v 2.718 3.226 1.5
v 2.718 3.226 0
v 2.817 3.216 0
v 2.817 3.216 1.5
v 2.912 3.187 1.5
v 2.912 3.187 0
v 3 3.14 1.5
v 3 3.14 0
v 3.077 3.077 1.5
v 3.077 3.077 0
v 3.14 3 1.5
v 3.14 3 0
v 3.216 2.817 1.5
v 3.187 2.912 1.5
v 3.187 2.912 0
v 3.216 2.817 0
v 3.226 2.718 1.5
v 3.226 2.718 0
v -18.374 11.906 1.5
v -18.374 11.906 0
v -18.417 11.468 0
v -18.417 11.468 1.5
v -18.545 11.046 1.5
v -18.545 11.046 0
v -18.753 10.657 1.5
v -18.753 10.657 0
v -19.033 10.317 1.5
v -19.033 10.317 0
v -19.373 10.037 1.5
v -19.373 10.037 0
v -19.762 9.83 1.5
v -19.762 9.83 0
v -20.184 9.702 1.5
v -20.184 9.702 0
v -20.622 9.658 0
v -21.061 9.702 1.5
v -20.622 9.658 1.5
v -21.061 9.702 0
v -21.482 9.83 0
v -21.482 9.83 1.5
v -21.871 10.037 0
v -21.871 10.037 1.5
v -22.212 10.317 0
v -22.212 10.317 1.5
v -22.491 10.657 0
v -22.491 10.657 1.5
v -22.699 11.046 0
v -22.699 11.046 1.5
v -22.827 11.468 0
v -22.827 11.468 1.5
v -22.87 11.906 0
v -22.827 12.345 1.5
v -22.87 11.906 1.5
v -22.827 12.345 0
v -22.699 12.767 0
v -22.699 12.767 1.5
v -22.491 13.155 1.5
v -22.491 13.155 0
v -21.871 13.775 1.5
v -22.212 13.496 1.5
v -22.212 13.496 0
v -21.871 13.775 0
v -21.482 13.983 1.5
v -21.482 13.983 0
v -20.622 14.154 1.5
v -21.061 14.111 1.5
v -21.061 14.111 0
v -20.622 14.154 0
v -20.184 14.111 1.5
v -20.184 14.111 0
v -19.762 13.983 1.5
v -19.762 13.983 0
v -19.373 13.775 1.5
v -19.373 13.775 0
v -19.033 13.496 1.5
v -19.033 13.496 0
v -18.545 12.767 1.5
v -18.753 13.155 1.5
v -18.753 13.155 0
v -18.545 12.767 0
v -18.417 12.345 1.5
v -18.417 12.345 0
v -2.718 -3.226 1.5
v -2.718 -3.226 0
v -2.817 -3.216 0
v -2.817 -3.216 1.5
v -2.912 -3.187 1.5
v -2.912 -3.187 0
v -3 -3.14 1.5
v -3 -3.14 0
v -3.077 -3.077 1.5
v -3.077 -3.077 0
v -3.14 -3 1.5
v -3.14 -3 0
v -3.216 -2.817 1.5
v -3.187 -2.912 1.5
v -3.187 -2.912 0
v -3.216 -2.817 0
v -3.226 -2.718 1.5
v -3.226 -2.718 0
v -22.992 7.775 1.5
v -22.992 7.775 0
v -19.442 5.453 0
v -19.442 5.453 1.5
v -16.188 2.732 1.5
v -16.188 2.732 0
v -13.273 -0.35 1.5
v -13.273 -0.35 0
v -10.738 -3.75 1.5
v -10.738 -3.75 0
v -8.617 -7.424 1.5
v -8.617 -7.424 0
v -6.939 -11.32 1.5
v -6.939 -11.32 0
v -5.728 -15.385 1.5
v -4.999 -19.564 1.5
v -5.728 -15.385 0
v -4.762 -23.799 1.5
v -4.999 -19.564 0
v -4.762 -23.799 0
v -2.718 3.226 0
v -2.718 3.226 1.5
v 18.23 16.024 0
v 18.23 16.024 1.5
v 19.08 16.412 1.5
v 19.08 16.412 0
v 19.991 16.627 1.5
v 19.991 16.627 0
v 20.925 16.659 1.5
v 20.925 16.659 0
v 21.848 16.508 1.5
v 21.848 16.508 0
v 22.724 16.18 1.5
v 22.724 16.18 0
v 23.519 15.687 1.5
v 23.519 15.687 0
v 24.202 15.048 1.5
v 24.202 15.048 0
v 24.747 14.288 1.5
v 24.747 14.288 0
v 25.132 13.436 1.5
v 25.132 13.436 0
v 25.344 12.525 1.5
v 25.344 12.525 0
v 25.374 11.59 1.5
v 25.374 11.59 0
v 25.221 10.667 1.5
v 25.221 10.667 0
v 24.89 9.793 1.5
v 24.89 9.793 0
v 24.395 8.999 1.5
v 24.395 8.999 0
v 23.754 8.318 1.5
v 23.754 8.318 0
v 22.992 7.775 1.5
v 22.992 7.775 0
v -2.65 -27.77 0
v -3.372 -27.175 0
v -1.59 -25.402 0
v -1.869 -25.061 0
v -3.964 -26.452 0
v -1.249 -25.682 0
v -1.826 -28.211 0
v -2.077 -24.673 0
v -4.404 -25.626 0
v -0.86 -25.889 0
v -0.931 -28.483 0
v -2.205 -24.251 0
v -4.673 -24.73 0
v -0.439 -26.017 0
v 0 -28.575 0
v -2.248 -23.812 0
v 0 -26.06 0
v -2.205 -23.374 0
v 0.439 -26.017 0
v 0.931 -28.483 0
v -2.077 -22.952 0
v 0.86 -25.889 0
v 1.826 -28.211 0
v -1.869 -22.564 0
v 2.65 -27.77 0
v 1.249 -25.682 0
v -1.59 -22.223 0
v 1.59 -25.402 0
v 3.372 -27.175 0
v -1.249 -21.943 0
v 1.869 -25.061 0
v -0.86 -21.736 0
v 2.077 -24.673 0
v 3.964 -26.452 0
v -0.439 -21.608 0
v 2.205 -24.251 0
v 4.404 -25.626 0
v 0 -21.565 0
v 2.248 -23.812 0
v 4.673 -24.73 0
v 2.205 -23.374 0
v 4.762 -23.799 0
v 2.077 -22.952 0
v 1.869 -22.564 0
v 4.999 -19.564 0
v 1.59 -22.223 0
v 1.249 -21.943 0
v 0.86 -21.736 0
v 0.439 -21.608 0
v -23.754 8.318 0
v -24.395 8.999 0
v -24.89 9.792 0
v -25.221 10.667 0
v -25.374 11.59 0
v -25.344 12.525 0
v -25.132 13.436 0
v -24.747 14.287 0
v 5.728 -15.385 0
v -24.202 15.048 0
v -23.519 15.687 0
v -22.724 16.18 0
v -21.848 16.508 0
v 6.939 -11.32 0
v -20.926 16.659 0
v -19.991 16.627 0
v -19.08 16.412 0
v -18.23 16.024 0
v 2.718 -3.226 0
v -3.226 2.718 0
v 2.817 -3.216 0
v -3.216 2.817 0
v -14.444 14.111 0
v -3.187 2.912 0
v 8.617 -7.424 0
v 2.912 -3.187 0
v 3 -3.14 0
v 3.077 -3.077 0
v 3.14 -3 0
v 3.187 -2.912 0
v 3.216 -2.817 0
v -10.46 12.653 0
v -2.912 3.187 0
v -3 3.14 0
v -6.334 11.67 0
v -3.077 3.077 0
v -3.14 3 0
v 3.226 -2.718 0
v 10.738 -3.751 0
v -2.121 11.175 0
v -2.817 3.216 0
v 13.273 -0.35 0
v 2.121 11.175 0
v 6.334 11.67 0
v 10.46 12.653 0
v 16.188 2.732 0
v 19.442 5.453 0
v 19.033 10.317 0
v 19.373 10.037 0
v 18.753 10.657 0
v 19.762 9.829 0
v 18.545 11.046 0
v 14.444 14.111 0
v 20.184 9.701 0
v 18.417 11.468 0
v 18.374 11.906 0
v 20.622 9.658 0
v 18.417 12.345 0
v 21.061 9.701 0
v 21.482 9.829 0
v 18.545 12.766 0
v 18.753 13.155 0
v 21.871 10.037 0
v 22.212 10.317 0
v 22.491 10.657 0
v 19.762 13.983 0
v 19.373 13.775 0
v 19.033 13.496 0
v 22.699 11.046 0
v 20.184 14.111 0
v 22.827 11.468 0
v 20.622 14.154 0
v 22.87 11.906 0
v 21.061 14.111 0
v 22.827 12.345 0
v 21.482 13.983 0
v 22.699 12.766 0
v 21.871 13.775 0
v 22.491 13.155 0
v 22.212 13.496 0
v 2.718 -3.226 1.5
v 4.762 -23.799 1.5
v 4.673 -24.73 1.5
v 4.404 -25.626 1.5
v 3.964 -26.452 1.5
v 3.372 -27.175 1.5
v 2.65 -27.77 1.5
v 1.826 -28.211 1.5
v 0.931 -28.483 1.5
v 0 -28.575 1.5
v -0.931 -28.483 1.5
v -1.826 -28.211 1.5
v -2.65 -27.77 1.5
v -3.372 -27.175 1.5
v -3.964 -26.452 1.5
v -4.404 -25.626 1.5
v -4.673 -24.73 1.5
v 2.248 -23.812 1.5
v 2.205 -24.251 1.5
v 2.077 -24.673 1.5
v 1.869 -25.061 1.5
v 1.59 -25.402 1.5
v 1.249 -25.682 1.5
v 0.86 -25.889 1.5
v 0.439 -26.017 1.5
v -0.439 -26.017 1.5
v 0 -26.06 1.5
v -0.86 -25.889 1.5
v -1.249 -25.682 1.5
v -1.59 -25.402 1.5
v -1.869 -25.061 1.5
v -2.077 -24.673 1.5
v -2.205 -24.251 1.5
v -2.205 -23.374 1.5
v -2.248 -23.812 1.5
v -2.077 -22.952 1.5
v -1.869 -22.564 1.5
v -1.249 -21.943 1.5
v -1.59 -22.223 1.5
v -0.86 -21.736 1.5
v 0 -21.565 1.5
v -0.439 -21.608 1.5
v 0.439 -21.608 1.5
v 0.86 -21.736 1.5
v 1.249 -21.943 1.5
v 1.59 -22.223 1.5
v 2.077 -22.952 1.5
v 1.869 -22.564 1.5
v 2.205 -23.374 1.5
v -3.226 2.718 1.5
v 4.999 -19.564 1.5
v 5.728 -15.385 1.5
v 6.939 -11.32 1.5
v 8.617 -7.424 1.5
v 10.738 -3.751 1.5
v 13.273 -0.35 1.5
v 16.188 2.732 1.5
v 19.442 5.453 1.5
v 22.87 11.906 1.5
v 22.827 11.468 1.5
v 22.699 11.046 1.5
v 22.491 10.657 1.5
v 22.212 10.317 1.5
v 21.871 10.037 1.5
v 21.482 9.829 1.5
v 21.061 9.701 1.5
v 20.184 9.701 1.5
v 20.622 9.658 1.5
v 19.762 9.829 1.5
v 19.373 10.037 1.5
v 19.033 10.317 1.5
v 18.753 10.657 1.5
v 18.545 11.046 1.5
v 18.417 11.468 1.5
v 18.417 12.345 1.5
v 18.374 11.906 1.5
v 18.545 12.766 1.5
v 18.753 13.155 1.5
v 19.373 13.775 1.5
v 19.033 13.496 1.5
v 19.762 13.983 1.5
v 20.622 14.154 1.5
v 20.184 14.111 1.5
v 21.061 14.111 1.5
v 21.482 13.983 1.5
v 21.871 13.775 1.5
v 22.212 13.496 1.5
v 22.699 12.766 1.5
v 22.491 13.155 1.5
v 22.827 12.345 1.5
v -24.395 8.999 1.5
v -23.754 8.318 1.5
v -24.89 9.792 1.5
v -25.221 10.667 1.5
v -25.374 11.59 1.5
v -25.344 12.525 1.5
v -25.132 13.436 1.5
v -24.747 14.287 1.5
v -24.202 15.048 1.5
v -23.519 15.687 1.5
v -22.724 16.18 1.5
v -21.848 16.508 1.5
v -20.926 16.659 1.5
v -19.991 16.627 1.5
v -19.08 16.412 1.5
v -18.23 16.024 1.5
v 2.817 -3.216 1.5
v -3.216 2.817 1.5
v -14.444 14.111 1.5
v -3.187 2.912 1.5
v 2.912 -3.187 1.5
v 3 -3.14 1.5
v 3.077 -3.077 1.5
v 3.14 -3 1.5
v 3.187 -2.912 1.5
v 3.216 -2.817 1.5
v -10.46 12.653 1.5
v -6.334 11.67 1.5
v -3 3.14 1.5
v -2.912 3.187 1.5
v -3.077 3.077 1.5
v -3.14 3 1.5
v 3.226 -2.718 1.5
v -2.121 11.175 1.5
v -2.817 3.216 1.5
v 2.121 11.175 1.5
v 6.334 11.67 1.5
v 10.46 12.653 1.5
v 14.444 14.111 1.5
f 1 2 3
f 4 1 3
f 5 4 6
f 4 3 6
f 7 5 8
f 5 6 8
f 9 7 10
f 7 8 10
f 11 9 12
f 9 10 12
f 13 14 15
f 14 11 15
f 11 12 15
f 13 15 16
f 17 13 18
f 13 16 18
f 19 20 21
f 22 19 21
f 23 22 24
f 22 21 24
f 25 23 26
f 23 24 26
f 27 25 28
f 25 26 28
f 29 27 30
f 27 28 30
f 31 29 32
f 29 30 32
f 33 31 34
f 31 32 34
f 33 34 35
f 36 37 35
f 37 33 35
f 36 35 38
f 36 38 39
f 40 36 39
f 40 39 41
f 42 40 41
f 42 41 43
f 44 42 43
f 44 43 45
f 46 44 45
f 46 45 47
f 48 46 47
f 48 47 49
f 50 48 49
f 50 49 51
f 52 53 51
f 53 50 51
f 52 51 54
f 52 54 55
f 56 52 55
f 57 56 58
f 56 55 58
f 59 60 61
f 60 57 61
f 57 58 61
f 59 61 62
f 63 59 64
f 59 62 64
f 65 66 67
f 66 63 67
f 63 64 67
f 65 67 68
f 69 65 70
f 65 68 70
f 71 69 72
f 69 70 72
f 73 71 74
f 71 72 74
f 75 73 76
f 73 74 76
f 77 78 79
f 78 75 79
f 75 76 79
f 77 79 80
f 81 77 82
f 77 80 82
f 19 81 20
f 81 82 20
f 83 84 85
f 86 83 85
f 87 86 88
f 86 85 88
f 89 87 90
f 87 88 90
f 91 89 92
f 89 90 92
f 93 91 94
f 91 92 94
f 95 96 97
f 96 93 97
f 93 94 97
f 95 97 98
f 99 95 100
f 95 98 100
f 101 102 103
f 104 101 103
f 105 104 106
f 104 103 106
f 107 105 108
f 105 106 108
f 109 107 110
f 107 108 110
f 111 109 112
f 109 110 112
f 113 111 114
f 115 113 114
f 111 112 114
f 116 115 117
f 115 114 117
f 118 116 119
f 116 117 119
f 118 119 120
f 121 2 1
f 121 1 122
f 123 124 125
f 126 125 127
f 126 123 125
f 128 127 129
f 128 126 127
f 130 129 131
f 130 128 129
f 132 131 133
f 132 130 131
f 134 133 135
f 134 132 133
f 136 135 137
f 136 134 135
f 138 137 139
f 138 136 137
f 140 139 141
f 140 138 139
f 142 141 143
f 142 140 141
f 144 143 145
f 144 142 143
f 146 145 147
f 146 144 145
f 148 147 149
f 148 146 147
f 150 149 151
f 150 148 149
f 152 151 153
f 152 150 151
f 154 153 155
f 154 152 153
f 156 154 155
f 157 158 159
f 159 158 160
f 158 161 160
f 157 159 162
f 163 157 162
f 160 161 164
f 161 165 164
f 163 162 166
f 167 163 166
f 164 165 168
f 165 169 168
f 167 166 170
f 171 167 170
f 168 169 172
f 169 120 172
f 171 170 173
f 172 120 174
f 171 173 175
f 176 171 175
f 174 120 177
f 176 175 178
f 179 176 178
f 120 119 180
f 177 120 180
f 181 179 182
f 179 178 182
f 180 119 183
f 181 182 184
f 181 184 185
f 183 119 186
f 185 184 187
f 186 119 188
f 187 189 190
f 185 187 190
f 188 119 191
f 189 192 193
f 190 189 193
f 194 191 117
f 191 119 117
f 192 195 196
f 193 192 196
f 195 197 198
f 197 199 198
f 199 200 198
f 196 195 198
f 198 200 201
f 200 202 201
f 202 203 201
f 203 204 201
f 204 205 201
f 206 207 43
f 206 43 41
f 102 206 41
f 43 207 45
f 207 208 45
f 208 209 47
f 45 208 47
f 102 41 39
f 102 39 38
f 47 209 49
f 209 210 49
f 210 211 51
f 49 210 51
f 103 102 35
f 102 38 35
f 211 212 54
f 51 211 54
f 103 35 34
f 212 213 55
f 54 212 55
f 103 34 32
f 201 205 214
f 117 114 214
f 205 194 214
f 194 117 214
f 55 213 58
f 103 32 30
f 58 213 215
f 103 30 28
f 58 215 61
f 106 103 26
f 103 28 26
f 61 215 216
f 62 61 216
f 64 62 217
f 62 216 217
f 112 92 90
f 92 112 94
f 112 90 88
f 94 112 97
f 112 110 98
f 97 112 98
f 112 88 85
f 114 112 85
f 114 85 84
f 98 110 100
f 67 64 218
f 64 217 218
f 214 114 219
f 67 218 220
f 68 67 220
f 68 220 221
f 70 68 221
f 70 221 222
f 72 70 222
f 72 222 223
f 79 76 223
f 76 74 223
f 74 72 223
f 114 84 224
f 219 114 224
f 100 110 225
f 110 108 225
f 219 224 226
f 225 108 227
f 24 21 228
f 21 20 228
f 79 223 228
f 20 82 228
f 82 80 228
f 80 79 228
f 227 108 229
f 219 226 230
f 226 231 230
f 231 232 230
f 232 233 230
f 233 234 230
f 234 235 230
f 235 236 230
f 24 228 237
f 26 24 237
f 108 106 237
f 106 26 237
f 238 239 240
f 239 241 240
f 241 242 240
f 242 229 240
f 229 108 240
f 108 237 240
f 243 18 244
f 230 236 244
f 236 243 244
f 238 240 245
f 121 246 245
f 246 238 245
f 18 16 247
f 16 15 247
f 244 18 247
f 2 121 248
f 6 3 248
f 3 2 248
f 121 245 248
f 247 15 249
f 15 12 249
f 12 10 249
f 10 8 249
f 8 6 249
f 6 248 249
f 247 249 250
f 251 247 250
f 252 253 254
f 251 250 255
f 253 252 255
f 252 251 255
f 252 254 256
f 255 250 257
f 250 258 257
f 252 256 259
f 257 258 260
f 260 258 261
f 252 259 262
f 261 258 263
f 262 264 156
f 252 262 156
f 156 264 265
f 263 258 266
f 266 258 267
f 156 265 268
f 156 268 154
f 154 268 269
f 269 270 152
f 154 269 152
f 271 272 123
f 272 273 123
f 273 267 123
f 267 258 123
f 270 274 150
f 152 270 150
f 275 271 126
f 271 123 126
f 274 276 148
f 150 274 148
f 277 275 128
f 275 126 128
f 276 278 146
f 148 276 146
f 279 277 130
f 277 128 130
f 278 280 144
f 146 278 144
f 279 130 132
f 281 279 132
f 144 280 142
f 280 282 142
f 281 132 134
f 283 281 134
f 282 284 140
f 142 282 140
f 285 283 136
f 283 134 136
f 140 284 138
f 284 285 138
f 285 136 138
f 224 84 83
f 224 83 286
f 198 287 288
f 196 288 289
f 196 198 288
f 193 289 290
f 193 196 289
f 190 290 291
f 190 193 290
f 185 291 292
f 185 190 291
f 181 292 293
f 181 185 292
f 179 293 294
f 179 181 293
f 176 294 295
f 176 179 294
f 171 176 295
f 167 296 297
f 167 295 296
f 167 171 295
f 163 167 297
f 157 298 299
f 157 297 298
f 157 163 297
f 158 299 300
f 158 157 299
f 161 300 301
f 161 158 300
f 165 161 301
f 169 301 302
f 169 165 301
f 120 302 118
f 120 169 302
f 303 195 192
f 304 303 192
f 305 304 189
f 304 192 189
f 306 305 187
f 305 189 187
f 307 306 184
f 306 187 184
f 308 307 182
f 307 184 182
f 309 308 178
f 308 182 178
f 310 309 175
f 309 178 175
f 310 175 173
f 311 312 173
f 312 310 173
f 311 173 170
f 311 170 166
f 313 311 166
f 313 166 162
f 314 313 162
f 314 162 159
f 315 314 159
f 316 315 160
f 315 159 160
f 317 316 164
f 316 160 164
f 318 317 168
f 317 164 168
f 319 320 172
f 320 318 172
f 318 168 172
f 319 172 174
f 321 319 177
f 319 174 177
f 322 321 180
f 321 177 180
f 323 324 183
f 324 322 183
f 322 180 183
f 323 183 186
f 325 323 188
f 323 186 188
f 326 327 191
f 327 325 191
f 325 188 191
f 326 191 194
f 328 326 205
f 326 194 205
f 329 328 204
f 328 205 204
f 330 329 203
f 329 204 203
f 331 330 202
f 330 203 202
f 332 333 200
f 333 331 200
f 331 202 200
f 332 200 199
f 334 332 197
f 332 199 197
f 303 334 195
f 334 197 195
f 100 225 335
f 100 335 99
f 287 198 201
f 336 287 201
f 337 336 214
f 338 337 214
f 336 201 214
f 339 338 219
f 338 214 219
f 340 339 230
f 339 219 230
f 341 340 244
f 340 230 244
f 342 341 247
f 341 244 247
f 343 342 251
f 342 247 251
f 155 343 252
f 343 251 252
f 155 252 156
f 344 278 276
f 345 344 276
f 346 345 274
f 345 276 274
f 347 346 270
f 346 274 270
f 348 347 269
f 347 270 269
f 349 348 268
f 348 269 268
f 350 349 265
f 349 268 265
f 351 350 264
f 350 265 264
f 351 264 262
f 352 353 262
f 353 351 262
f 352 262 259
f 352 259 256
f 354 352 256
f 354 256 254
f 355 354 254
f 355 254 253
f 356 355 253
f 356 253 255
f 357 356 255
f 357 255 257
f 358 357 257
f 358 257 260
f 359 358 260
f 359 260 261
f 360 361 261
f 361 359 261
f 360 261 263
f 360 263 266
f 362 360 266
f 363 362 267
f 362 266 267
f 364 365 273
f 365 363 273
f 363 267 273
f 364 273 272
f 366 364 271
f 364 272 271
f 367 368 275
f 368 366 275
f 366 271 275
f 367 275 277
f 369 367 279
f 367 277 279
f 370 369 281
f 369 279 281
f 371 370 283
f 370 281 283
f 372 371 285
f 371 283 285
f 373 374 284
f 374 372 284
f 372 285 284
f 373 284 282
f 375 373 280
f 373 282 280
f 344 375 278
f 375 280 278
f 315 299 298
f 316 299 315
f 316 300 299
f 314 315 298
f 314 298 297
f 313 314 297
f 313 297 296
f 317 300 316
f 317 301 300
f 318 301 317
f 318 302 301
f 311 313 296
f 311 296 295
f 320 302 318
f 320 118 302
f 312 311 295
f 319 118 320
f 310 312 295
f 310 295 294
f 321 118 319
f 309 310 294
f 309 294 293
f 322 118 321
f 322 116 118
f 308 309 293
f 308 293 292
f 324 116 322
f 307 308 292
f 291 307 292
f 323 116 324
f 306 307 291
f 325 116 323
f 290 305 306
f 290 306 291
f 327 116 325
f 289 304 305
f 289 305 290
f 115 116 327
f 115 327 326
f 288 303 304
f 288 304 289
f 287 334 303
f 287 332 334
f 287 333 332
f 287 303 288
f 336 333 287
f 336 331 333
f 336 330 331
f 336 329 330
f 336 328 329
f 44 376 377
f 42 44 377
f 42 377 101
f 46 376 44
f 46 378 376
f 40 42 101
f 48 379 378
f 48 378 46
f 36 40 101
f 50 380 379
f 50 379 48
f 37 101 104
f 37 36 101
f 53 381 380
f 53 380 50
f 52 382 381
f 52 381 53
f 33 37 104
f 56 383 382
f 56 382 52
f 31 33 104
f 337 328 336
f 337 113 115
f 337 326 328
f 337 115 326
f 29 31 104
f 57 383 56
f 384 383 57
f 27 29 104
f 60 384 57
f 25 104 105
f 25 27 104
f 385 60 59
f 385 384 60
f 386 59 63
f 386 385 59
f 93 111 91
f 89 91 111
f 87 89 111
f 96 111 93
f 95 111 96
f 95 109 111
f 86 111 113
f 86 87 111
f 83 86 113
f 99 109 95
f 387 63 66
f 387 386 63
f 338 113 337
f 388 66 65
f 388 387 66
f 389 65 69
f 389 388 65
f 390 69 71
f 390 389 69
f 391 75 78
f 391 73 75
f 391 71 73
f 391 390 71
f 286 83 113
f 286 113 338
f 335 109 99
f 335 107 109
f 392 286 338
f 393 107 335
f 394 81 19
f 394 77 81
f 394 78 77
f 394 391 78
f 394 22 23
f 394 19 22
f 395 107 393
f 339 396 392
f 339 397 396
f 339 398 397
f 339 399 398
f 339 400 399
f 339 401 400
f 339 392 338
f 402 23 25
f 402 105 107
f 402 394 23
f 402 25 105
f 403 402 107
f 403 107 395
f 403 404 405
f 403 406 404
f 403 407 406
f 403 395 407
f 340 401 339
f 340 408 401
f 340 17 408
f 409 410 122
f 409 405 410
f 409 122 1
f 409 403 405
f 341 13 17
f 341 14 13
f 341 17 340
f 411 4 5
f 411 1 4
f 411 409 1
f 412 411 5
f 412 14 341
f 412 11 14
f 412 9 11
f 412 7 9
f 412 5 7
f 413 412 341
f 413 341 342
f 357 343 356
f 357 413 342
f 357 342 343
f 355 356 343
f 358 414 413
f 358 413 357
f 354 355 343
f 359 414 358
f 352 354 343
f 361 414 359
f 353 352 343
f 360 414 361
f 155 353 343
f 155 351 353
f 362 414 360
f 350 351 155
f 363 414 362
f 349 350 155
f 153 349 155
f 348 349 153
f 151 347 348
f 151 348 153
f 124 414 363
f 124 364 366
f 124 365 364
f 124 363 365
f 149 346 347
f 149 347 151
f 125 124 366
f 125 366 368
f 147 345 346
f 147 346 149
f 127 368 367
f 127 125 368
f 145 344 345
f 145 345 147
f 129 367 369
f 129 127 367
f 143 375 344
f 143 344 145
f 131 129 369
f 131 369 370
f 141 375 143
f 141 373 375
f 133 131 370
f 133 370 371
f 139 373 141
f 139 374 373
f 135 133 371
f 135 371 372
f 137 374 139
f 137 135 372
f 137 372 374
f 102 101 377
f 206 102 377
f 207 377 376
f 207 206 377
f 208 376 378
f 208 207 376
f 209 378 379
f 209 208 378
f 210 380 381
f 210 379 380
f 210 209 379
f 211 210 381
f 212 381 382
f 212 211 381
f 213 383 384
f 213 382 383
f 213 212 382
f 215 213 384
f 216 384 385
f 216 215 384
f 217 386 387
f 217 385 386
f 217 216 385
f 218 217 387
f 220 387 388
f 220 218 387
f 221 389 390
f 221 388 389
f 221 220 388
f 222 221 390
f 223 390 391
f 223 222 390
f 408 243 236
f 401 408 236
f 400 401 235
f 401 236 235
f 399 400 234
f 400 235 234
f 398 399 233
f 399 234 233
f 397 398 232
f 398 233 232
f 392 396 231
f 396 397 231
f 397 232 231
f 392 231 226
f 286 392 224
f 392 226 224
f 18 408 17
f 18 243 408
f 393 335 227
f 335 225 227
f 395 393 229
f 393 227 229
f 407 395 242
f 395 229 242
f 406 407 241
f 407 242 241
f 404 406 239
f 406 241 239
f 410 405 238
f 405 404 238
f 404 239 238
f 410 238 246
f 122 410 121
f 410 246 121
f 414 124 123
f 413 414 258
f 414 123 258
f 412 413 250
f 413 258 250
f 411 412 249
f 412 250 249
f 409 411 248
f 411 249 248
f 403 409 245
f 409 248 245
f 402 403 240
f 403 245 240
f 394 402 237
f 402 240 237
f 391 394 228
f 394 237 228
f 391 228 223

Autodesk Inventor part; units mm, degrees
ref_plane "YZ Plane" through (0, 0, 0) normal (1, 0, 0) x (0, 1, 0)
ref_plane "XZ Plane" through (0, 0, 0) normal (0, 1, 0) x (-1, 0, 0)
ref_plane "XY Plane" through (0, 0, 0) normal (0, 0, 1) x (1, 0, 0)
ref_plane "Work Plane1" through (0, 0, 0) normal (0, 0, 1) x (1, 0, 0)
sketch "Sketch1" plane through (0, 0, 0) normal (0, 0, 1) x (1, 0, 0)
  circle A0 centre (0, -23.8125) radius 2.1526 construction
  circle A1 centre (20.6222, 11.9063) radius 2.1526 construction
  circle A2 centre (-20.6222, 11.9062) radius 2.1526 construction
  line L0 (2.7178, 3.2258) -> (-2.7178, 3.2258)
  line L1 (-3.2258, 2.7178) -> (-3.2258, -2.7178)
  line L2 (-2.7178, -3.2258) -> (2.7178, -3.2258)
  line L3 (3.2258, -2.7178) -> (3.2258, 2.7178)
  line L4 (3.2258, 3.2258) -> (-3.2258, -3.2258) construction
  line L5 (-3.2258, 3.2258) -> (3.2258, -3.2258) construction
  arc A3 (2.7178, -3.2258) -> (3.2258, -2.7178) centre (2.7178, -2.7178) ccw
  arc A4 (-3.2258, -2.7178) -> (-2.7178, -3.2258) centre (-2.7178, -2.7178) ccw
  arc A5 (-2.7178, 3.2258) -> (-3.2258, 2.7178) centre (-2.7178, 2.7178) ccw
  arc A6 (3.2258, 2.7178) -> (2.7178, 3.2258) centre (2.7178, 2.7178) ccw
  circle A7 centre (0, 0) radius 11.1125
  circle A8 centre (0, -23.8125) radius 4.7625
  circle A9 centre (-20.6222, 11.9062) radius 4.7625
  circle A10 centre (20.6222, 11.9063) radius 4.7625
  arc A11 (22.9921, 7.7752) -> (4.7625, -23.7993) centre (41.0481, -23.6991) ccw
  arc A12 (-18.2296, 16.0241) -> (18.2296, 16.0241) centre (0, 47.3982) ccw
  arc A13 (-4.7625, -23.7993) -> (-22.9921, 7.7752) centre (-41.0481, -23.6991) ccw
  circle A14 centre (0, -23.8125) radius 2.2479
  circle A15 centre (20.6222, 11.9062) radius 2.2479
  circle A16 centre (-20.6222, 11.9063) radius 2.2479
  point P0 (18.2296, 16.0241)
  point P1 (-18.2296, 16.0241)
  point P2 (-22.9921, 7.7752)
  point P3 (-4.7625, -23.7993)
  dimension "d3" = 9.525
  dimension "d0" = 0.508
  dimension "d1" = 6.4516
  dimension "d2" = 22.225
  dimension "d6" = 360
  dimension "d8" = 4.4958
  dimension "d11" = 360
extrude "Extrusion1" add sketch "Sketch1" along normal blind 1.5
properties part number "3in flex wheel holder"
